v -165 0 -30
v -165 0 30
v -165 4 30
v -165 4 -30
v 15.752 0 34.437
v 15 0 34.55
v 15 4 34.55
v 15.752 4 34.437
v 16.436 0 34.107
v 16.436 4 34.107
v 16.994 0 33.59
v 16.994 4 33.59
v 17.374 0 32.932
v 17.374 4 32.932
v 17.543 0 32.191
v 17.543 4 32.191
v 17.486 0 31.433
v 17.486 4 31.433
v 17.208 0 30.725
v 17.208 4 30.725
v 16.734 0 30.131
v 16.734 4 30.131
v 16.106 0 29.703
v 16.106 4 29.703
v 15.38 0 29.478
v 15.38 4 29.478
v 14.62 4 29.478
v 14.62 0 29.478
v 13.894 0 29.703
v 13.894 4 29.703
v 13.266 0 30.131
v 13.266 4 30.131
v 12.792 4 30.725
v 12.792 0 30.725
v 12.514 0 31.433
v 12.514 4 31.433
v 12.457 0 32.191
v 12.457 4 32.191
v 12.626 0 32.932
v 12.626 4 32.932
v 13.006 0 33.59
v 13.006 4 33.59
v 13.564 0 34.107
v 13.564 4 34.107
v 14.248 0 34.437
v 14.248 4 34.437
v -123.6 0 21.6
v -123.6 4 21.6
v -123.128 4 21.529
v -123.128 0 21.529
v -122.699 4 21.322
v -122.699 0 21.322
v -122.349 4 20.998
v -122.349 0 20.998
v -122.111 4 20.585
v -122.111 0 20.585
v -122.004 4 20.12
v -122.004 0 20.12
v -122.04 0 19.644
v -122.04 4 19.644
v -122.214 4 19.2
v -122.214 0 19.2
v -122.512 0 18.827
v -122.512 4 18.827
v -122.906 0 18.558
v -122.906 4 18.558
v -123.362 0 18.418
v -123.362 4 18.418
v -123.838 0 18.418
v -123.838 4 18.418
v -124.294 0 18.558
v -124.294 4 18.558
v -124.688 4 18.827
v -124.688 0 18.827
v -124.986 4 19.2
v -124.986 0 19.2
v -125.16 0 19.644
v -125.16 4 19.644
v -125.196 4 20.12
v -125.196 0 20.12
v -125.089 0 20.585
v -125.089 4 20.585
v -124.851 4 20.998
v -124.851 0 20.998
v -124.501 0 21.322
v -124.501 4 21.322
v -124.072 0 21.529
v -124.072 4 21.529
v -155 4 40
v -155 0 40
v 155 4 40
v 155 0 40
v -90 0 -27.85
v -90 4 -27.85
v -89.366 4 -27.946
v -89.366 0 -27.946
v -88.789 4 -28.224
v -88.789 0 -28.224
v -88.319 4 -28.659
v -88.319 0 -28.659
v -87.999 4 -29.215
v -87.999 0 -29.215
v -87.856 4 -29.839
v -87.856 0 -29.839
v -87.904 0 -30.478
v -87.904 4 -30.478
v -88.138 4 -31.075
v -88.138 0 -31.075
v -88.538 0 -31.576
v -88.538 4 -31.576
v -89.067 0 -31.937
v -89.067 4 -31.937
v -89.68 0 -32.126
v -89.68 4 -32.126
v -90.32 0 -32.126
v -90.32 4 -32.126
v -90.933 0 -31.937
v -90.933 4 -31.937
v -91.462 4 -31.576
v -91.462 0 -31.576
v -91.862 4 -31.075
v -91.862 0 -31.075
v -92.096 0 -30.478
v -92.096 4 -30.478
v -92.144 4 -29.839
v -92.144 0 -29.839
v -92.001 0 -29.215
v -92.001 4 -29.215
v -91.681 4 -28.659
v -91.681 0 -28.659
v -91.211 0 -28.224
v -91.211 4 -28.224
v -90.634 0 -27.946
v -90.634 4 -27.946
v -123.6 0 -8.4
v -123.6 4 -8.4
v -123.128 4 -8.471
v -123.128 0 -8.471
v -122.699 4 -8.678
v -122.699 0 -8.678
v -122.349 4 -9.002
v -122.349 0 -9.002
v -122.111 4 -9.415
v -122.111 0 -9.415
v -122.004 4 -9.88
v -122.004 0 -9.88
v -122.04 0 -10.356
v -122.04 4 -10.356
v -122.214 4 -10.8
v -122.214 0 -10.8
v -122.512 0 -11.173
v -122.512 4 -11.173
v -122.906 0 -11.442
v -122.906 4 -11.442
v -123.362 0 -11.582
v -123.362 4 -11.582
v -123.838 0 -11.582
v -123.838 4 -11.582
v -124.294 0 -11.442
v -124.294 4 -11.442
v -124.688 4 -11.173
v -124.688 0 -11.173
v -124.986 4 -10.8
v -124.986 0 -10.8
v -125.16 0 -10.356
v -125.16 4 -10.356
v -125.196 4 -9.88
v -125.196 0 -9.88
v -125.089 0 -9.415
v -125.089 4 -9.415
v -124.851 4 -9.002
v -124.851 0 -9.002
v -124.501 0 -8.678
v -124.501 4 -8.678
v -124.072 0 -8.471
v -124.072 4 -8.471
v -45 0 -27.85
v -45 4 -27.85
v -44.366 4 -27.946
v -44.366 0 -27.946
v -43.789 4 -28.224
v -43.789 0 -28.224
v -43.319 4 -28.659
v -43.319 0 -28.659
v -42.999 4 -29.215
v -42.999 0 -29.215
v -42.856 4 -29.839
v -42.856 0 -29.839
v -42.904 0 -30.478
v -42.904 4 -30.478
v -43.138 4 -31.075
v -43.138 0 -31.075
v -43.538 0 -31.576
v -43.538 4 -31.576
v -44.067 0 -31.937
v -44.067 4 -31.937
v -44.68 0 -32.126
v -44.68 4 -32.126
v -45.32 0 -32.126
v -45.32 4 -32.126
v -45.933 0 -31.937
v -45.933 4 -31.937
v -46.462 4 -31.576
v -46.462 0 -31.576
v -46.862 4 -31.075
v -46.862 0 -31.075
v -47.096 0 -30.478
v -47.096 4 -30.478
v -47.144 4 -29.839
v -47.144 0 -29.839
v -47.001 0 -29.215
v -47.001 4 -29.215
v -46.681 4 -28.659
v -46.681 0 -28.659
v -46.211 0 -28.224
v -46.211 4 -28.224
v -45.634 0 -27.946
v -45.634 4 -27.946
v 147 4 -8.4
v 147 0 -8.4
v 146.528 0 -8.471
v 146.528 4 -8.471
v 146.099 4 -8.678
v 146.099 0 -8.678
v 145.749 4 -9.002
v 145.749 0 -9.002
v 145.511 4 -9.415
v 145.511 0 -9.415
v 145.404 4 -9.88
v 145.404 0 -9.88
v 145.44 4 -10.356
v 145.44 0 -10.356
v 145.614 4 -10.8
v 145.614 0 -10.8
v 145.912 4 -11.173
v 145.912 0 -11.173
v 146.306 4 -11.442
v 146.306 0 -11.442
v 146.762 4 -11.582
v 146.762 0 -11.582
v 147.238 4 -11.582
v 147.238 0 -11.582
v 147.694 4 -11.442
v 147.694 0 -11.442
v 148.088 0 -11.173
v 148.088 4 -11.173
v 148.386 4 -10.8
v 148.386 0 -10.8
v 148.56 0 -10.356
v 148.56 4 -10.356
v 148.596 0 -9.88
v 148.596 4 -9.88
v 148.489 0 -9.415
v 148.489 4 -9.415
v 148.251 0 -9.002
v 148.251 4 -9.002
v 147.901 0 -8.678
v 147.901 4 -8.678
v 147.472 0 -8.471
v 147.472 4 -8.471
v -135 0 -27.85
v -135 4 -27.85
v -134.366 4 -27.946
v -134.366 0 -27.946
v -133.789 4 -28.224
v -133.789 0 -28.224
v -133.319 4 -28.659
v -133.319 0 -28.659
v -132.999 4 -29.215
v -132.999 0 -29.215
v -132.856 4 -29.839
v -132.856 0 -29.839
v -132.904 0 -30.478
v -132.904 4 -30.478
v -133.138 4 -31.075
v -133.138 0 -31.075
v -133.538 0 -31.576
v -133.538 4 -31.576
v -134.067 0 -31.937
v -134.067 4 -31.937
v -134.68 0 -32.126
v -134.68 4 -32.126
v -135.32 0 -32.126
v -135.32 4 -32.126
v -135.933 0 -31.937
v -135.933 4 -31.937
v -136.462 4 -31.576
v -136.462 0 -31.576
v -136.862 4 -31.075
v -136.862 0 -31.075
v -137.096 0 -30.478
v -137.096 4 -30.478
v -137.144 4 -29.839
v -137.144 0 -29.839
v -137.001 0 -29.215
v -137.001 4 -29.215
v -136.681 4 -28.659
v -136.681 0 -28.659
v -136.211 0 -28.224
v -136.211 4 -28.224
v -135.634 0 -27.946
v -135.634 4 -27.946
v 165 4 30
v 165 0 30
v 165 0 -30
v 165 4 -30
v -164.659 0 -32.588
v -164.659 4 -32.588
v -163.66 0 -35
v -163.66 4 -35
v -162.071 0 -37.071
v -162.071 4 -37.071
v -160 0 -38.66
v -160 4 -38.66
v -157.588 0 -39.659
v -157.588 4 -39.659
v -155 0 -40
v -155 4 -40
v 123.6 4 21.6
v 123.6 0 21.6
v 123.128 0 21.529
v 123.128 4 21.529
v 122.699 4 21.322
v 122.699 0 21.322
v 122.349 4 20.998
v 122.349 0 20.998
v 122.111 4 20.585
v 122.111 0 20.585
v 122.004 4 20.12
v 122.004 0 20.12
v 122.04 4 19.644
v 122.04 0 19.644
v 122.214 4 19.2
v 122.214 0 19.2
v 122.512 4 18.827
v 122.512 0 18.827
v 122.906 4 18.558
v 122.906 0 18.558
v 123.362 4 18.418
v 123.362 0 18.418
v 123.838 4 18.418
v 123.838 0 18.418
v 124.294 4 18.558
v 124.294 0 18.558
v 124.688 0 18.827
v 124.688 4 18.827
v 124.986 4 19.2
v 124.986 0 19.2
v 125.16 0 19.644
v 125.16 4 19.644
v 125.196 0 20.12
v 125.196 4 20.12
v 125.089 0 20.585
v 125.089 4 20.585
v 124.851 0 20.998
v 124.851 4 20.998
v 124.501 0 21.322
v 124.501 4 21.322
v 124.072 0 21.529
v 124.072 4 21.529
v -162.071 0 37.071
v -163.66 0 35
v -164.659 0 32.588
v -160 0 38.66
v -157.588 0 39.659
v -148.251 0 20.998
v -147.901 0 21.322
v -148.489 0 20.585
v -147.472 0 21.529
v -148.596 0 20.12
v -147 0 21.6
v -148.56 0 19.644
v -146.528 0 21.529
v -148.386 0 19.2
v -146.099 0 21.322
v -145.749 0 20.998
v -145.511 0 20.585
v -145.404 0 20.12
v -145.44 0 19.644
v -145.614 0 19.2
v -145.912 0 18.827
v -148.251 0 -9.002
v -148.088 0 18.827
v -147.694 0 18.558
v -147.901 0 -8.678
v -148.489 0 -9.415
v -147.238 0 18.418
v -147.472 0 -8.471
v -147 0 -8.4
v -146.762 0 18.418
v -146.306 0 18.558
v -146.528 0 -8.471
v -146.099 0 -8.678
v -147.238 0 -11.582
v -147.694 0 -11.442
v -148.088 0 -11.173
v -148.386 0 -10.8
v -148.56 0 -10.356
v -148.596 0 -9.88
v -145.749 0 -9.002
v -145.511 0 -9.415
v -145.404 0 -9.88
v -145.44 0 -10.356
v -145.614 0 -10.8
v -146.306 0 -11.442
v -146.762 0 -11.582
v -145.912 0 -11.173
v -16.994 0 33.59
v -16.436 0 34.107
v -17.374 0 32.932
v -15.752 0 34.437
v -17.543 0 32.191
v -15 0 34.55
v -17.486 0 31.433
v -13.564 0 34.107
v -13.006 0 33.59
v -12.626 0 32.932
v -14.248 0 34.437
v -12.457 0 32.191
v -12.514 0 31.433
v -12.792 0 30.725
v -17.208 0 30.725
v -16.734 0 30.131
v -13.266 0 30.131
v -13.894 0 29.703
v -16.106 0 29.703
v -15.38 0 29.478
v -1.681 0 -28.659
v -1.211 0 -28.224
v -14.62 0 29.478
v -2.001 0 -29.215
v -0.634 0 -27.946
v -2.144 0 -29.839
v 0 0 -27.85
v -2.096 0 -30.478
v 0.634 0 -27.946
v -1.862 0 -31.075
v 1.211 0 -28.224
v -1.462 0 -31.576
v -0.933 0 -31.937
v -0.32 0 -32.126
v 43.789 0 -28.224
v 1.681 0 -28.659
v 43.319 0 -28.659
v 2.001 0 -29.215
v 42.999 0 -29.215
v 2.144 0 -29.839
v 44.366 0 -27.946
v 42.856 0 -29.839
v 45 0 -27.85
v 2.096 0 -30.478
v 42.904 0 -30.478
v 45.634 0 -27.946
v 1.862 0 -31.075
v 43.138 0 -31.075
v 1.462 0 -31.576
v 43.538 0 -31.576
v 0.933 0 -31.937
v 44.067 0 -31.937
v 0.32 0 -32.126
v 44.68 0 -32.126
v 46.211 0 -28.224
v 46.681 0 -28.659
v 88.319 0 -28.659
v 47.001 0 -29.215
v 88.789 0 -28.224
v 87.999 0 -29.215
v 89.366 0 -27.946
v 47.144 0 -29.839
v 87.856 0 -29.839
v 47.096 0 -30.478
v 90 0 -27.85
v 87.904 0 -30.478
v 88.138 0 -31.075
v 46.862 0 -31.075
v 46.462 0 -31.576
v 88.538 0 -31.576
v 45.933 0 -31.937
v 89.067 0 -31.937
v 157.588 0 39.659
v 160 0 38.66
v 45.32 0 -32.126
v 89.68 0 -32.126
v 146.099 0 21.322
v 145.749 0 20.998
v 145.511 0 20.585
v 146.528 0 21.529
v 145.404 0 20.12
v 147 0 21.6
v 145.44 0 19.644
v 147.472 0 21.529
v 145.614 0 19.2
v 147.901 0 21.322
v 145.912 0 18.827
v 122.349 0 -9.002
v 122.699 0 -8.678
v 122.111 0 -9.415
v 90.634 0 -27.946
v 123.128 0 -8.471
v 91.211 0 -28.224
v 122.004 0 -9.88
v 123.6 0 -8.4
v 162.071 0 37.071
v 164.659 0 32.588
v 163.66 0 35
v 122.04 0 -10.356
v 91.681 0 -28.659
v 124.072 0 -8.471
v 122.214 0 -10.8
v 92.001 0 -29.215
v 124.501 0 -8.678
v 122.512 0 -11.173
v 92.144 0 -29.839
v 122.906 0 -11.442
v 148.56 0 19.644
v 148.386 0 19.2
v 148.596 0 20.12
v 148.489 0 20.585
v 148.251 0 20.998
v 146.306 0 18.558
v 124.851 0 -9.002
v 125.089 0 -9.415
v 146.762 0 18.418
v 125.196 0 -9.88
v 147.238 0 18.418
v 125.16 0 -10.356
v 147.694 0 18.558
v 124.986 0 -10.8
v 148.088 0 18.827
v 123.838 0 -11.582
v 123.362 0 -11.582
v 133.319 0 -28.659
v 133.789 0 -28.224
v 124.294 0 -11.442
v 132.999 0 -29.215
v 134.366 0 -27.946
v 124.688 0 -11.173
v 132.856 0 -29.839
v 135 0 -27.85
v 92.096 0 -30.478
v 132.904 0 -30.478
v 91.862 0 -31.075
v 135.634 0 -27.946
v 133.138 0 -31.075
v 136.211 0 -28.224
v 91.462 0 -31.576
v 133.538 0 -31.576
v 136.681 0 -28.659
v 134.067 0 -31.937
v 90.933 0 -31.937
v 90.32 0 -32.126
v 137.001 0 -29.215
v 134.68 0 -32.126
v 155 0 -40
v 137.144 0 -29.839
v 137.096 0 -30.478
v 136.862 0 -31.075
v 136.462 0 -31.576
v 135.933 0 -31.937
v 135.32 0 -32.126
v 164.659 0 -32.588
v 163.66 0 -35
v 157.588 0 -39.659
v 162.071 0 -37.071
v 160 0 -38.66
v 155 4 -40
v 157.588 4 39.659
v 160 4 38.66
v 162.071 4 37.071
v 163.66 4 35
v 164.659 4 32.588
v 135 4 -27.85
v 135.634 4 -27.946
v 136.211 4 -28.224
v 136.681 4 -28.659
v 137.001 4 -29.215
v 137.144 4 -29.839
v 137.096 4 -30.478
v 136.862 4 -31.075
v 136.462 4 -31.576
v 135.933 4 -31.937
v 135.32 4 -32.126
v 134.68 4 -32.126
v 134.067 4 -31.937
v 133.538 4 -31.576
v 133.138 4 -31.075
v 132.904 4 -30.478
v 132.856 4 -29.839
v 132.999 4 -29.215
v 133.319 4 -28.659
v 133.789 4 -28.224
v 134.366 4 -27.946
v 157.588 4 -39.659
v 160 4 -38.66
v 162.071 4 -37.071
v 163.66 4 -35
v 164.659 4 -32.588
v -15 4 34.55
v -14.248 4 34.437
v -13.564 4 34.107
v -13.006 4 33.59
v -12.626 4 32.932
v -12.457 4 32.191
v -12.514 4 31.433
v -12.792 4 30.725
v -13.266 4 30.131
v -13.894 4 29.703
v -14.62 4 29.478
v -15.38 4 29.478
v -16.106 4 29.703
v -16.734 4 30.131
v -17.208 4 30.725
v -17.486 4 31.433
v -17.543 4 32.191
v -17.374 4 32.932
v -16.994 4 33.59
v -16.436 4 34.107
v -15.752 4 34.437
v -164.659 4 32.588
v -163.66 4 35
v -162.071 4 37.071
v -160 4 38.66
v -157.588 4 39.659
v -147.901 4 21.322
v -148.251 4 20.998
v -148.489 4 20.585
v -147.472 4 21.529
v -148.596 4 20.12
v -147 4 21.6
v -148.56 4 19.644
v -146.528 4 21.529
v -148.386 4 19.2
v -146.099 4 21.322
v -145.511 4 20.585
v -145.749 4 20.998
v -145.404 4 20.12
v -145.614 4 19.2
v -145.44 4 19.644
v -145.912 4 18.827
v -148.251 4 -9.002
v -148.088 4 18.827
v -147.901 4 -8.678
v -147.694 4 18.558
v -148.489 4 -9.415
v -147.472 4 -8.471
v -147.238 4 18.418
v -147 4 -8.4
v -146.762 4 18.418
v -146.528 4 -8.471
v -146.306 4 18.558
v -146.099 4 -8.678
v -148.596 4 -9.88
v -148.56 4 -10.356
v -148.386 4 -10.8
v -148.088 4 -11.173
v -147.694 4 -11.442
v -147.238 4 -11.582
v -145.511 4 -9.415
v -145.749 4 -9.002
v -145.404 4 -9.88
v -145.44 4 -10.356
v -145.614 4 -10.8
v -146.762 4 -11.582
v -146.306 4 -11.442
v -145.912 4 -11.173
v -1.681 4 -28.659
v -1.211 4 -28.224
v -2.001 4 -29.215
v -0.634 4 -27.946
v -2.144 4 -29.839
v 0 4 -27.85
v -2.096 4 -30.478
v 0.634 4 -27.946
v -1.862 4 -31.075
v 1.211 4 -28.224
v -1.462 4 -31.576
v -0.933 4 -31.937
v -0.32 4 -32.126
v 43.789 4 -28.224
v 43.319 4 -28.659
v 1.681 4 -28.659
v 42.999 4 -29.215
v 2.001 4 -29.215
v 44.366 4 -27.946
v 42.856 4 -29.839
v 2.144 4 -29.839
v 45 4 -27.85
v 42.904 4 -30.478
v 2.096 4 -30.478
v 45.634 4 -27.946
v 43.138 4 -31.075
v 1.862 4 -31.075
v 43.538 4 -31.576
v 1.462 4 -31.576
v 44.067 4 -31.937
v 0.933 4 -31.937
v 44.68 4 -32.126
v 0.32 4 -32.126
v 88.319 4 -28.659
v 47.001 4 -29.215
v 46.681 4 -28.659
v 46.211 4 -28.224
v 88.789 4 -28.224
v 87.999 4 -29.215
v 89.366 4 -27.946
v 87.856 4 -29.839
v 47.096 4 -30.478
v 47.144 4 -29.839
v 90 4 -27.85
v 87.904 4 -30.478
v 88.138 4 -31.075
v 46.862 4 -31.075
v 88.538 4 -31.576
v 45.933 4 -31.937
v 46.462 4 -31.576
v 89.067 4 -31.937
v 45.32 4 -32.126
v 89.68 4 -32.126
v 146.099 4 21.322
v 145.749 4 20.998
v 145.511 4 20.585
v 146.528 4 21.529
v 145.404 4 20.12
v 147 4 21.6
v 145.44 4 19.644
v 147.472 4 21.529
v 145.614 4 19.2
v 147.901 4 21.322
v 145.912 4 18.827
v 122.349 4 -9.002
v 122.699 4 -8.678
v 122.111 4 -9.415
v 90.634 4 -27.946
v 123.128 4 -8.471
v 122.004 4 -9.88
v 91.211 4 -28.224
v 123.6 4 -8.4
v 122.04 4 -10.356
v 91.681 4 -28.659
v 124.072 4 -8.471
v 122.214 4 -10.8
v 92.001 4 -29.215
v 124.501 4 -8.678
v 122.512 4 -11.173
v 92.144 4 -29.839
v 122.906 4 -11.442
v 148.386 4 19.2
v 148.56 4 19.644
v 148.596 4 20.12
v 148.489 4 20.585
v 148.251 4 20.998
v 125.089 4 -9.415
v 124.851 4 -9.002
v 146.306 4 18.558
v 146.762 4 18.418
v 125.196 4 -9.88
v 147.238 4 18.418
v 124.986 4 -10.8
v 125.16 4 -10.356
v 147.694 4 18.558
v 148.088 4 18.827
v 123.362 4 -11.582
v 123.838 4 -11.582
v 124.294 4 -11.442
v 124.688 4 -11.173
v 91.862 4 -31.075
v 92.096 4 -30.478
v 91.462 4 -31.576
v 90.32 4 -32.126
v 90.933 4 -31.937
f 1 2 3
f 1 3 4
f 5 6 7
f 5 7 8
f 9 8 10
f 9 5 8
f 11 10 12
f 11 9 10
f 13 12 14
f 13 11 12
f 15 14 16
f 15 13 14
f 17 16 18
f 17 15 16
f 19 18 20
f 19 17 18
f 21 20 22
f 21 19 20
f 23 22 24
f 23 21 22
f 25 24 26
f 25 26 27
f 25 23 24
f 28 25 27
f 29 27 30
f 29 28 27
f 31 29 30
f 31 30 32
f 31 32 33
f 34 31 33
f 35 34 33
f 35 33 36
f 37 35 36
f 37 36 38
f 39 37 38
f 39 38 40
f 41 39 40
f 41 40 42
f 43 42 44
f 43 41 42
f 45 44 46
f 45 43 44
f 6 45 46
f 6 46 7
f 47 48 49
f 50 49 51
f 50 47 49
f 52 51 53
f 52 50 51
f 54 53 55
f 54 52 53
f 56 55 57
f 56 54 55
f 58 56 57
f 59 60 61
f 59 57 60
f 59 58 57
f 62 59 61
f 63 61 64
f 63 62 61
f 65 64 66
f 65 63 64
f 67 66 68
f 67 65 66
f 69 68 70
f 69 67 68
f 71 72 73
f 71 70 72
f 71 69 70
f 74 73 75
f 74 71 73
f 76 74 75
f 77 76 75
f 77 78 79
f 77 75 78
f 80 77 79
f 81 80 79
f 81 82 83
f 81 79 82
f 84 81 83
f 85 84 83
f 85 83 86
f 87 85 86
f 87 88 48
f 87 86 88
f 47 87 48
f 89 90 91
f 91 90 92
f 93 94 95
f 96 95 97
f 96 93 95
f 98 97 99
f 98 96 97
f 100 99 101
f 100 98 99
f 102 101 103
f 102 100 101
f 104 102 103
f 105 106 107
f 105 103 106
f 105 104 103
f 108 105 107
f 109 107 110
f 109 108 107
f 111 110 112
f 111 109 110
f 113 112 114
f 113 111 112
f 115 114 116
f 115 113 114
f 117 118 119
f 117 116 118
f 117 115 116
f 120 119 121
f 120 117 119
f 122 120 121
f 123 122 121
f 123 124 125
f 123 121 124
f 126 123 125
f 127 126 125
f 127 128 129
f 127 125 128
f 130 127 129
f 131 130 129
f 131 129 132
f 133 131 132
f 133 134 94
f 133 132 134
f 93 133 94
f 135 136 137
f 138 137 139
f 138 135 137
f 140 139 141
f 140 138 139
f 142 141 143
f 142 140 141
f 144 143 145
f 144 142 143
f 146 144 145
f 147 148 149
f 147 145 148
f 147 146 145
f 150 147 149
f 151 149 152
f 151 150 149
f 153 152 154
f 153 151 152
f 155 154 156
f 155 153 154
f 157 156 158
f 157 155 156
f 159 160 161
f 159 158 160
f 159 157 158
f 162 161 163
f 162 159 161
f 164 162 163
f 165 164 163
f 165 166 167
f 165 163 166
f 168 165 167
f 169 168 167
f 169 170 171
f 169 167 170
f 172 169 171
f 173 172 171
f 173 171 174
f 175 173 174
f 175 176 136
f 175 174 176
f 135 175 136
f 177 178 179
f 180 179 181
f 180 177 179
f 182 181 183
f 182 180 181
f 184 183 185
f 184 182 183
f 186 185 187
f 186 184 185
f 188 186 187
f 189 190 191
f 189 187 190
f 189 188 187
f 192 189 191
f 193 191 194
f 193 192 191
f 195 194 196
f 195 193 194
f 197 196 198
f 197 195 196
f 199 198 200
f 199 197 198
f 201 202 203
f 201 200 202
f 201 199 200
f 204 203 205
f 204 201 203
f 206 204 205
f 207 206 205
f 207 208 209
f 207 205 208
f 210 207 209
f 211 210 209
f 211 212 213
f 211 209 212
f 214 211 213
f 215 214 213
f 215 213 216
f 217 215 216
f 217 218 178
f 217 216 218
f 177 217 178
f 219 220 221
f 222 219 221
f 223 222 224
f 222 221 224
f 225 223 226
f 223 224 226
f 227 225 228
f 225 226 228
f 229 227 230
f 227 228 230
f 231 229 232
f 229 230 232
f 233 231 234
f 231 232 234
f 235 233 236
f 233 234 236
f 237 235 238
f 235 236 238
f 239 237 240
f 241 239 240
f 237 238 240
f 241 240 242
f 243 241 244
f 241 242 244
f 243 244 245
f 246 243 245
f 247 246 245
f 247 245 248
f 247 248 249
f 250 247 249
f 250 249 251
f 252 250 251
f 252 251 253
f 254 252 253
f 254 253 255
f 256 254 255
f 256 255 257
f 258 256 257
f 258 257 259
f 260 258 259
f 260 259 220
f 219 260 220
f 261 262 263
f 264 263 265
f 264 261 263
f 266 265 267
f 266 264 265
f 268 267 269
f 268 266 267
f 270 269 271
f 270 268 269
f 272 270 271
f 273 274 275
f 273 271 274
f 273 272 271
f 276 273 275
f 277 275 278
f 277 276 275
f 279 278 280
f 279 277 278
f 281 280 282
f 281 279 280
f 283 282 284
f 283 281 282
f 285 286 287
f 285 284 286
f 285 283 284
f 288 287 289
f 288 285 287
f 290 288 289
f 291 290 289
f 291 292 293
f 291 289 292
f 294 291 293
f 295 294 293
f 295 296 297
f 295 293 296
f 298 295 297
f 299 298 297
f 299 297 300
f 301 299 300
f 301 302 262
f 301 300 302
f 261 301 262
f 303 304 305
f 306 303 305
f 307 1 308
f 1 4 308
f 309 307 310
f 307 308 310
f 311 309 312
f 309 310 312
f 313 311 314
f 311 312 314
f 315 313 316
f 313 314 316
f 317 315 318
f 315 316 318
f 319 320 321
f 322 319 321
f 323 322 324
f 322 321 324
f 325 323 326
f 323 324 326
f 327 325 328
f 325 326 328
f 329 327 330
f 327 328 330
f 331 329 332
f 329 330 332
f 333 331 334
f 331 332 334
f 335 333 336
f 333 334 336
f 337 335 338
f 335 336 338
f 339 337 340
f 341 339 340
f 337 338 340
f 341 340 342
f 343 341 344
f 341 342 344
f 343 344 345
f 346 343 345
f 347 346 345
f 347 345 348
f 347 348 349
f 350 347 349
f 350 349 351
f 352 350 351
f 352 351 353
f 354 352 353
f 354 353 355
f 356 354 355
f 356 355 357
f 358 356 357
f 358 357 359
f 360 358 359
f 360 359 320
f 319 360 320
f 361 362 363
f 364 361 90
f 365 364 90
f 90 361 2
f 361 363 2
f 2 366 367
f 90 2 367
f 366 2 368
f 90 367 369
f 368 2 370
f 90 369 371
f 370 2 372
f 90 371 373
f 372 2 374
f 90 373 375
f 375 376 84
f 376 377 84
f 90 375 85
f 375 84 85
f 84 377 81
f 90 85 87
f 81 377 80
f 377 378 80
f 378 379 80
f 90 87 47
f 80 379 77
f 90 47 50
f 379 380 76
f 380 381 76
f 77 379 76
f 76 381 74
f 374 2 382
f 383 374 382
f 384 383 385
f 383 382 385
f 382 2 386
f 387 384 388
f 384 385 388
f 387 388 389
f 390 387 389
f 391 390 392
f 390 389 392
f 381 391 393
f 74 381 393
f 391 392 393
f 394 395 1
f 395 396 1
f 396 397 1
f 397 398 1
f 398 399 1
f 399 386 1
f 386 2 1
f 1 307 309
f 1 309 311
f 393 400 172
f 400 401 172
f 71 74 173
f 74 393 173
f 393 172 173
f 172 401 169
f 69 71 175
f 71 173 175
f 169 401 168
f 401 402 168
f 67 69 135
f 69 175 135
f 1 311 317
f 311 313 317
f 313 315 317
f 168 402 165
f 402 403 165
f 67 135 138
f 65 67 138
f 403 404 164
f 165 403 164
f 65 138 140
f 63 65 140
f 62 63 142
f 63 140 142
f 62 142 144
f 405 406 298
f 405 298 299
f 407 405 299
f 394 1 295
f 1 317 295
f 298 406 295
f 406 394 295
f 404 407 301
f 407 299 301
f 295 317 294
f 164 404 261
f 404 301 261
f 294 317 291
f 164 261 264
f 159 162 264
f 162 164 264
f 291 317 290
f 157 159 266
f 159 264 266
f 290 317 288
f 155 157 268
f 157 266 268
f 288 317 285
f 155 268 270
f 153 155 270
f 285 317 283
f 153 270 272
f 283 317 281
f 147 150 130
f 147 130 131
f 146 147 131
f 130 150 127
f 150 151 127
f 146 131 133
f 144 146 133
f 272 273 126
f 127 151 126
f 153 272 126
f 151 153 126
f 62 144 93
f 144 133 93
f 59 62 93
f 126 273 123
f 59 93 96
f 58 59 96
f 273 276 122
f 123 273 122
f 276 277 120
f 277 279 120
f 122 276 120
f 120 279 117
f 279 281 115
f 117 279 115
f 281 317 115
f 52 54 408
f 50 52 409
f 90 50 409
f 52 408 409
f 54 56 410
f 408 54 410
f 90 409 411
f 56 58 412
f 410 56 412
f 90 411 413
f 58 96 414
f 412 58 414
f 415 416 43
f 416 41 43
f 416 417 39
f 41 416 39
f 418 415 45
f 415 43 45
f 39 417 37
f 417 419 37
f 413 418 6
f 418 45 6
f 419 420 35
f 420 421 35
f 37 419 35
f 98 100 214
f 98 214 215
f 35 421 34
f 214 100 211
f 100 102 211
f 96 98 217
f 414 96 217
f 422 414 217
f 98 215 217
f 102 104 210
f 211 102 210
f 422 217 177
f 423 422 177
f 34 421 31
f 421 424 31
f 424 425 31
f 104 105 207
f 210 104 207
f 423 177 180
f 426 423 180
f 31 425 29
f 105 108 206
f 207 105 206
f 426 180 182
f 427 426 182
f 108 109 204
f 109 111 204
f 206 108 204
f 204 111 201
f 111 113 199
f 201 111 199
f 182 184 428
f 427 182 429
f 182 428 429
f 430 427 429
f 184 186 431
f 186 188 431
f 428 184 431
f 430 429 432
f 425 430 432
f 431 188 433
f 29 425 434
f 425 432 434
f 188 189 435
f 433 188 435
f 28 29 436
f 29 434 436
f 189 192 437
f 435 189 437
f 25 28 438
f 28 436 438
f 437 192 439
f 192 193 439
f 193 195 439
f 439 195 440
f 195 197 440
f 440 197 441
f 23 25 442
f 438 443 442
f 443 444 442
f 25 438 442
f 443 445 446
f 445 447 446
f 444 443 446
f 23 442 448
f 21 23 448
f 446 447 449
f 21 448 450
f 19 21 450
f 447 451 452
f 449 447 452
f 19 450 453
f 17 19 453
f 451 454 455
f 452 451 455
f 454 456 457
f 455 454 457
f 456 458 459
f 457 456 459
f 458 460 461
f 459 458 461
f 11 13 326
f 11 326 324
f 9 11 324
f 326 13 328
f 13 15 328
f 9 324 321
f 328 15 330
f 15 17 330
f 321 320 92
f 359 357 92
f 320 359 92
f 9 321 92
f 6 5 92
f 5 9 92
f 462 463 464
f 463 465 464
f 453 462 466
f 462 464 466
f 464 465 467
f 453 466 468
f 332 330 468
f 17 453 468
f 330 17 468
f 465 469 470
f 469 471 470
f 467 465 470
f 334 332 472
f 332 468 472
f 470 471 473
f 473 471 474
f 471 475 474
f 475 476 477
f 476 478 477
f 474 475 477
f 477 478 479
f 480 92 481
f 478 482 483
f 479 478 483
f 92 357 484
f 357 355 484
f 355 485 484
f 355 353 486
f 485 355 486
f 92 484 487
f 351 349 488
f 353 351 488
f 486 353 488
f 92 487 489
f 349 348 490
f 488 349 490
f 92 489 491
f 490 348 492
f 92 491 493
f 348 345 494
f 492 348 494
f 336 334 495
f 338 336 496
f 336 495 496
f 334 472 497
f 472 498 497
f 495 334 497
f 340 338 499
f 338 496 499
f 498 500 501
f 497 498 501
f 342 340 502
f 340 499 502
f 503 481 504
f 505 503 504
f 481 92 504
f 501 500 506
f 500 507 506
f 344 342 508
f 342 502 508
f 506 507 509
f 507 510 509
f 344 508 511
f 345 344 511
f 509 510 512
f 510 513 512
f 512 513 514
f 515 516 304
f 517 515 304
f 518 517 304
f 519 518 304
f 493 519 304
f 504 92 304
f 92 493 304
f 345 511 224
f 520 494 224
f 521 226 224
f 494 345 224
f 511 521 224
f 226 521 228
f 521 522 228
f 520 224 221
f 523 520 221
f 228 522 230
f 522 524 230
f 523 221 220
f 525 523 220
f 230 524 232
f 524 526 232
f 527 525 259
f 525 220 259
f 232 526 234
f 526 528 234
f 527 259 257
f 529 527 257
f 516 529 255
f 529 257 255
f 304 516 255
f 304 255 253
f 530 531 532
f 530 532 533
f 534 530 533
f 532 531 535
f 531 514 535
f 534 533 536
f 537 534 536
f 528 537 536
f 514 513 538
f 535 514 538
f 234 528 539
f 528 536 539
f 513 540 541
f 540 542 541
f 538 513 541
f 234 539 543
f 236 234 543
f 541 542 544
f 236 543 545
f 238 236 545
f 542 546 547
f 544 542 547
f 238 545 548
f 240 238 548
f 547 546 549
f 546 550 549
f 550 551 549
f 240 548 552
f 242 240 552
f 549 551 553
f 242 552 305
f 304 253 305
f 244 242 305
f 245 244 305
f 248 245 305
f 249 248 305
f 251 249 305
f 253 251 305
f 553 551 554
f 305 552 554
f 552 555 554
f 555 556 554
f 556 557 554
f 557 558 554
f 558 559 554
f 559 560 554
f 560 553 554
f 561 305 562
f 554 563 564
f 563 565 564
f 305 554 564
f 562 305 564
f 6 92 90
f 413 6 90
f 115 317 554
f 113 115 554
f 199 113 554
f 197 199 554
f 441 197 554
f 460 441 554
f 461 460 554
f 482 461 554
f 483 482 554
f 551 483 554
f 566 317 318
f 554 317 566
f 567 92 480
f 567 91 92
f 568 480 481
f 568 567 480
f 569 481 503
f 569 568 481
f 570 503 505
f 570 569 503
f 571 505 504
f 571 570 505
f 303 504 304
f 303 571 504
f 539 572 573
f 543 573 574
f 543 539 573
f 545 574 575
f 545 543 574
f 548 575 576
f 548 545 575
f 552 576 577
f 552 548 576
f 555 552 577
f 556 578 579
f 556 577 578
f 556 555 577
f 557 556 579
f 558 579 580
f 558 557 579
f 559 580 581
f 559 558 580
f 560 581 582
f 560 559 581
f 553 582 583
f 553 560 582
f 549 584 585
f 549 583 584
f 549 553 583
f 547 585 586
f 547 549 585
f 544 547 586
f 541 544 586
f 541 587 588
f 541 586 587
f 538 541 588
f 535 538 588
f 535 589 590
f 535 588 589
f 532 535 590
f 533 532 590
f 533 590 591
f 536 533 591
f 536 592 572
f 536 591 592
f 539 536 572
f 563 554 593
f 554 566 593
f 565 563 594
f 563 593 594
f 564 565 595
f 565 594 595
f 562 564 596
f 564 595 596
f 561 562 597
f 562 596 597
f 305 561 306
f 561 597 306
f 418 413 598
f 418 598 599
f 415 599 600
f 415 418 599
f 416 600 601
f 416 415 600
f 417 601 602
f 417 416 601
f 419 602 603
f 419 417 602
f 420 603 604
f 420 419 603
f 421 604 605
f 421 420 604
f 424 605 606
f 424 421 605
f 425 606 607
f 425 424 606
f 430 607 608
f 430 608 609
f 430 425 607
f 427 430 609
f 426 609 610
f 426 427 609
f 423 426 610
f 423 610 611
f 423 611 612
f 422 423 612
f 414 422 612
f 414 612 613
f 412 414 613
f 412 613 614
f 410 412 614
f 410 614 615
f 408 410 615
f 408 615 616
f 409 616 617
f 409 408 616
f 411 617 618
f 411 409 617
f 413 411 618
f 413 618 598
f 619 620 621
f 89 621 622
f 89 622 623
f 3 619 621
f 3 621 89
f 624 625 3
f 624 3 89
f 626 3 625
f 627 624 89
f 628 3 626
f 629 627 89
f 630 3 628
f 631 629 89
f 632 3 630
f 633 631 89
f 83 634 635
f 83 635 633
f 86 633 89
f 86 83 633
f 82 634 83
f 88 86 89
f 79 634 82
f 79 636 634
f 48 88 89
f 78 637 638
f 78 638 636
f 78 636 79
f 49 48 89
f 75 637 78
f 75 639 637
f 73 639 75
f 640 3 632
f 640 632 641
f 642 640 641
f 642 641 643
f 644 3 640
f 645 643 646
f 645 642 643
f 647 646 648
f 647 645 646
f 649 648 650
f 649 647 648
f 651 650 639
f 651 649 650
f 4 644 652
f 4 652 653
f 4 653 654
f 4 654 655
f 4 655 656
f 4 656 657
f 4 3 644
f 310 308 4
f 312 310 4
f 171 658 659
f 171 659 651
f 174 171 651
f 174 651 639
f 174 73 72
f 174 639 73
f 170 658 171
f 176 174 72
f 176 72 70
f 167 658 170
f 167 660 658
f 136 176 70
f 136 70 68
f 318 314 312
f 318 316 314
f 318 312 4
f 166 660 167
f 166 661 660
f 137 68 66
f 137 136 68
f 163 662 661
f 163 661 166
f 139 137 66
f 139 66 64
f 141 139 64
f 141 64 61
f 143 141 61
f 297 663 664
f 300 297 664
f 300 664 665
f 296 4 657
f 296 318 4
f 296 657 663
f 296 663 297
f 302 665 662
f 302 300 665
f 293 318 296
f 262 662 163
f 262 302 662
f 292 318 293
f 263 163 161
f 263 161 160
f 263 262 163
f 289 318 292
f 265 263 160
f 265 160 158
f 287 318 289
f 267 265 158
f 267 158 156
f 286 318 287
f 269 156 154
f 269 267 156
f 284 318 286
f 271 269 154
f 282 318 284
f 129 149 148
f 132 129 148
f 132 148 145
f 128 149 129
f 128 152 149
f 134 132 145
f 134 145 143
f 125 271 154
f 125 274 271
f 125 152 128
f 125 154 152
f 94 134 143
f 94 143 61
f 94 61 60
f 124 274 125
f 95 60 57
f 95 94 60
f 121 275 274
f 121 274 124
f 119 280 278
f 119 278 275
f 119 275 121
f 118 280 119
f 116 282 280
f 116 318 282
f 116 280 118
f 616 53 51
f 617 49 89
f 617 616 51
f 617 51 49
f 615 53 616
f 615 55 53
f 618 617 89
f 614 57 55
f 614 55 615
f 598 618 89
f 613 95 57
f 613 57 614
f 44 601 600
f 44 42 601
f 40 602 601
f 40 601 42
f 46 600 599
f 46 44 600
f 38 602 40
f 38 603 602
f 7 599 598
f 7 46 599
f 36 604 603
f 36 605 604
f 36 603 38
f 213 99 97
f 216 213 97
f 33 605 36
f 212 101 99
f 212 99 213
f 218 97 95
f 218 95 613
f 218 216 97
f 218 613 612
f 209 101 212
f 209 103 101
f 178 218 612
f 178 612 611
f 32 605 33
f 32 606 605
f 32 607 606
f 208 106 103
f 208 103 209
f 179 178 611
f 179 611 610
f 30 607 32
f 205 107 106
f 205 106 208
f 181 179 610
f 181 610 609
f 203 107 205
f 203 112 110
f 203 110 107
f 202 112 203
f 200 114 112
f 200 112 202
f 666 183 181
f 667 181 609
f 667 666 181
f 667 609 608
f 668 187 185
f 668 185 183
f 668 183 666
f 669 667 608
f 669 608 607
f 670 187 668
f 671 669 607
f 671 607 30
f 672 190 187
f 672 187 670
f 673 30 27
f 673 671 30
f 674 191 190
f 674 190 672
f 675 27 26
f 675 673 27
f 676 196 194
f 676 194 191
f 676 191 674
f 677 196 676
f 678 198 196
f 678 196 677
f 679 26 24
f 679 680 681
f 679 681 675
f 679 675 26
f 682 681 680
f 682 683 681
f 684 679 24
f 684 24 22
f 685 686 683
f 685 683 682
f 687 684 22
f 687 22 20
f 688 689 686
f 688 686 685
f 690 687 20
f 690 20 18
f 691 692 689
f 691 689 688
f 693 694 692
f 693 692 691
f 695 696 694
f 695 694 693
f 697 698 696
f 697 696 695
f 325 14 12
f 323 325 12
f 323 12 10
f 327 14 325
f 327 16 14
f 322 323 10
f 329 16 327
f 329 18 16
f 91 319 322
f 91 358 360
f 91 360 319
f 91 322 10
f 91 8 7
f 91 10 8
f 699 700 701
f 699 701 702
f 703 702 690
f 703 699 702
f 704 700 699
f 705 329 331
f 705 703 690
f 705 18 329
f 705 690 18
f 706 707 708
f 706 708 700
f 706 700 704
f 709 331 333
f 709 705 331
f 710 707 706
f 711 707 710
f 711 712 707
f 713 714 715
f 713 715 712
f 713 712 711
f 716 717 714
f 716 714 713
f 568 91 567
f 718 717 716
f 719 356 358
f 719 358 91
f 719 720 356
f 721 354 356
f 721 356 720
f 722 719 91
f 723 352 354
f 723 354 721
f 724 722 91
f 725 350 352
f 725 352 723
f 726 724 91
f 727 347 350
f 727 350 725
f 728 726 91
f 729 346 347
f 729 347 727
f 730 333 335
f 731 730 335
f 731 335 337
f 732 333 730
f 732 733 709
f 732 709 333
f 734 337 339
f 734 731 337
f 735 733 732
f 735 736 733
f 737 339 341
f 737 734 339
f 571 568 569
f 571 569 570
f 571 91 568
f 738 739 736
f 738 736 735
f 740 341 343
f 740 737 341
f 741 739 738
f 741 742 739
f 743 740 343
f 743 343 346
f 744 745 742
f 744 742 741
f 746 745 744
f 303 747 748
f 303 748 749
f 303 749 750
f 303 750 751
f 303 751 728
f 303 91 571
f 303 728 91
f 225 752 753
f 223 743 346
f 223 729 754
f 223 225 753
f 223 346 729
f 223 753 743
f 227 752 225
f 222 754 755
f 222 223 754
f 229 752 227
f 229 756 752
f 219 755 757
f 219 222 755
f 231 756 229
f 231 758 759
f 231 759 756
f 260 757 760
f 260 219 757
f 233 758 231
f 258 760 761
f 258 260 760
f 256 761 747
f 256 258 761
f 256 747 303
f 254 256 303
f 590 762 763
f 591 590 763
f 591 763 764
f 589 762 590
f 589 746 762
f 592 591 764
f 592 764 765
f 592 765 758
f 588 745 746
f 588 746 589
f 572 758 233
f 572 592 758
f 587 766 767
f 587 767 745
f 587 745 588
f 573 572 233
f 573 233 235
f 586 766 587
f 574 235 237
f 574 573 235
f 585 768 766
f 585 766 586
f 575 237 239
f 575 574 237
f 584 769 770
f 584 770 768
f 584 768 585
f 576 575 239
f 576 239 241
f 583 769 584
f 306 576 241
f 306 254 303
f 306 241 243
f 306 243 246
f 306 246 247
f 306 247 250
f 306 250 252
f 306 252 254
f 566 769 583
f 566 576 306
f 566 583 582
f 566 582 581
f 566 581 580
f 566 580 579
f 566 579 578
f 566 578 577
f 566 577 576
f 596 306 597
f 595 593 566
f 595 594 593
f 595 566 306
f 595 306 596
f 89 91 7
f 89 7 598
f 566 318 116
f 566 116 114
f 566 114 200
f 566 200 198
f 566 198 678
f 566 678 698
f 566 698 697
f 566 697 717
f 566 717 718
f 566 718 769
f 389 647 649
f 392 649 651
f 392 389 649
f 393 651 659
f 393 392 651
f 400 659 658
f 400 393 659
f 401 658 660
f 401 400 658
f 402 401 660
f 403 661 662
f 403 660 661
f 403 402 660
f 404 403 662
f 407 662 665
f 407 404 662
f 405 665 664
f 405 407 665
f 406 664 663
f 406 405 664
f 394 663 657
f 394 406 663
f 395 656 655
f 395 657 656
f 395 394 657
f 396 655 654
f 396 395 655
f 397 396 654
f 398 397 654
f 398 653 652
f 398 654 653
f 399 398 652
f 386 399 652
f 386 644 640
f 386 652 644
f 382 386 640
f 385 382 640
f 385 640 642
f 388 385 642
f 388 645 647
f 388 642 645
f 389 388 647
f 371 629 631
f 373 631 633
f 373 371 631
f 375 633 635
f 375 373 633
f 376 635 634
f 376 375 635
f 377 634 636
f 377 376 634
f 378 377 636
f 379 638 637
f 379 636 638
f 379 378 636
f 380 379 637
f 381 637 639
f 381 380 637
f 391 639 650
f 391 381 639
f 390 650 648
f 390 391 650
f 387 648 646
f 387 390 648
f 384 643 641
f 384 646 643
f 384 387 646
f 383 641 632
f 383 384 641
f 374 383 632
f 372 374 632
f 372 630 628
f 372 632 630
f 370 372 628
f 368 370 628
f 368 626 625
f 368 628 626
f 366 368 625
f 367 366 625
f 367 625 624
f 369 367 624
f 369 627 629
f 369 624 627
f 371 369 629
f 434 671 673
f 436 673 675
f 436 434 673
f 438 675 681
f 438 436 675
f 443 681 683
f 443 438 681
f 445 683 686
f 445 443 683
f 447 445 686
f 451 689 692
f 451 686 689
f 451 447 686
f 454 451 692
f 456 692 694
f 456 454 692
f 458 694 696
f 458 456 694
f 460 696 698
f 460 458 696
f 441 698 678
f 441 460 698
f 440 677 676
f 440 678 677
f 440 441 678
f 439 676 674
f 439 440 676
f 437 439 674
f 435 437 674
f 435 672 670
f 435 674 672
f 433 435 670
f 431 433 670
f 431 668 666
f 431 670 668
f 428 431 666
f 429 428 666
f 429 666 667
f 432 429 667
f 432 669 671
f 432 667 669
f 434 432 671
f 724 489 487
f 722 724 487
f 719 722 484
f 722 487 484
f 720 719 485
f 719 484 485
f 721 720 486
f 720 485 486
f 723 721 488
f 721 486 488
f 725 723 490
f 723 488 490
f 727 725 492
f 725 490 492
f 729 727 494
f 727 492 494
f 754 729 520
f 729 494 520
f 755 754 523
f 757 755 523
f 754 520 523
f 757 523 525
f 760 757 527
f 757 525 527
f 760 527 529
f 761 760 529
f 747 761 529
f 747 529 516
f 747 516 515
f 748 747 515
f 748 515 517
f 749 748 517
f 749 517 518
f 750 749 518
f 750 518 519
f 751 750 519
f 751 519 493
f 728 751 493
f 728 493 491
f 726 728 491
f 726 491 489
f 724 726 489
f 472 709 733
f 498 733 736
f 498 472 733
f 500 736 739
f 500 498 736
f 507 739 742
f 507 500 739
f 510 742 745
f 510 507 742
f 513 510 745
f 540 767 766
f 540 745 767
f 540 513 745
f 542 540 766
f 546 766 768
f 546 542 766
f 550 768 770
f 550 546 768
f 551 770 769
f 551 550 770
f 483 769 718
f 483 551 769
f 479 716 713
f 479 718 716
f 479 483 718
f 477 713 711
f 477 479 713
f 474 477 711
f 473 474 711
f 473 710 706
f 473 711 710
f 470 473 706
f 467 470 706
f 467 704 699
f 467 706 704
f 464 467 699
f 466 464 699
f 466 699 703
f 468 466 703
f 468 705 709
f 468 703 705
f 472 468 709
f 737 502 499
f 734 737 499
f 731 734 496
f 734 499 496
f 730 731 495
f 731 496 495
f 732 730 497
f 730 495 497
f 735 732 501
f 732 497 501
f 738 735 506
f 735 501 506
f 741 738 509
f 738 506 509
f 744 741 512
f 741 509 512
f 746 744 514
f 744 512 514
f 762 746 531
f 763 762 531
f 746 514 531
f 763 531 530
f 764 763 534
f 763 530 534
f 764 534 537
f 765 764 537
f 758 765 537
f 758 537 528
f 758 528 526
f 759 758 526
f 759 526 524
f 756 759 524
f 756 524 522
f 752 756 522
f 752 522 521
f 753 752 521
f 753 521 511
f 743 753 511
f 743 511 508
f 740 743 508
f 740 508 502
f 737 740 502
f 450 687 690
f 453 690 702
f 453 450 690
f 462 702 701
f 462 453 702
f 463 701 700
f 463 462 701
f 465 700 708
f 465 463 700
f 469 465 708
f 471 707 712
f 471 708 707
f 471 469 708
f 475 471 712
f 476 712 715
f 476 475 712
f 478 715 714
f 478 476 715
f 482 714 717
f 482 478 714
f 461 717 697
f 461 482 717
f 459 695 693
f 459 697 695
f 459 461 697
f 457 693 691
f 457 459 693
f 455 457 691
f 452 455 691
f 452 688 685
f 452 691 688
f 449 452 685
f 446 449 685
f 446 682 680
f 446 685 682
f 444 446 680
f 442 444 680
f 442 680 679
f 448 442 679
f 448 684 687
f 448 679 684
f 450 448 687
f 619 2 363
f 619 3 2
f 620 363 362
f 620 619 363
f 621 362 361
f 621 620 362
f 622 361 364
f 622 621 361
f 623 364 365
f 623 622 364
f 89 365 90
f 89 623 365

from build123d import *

# Parameters (mm, degrees)
SKETCH_2_W                 = 330
SKETCH_2_H                 = 80
SKETCH_2_R                 = 2.55
EXTRUDE_1_DEPTH            = 4
SKETCH_3_R                 = 1.6
CUT_EXTRUDE_1_DEPTH        = 170.826381932
SKETCH_4_R                 = 2.15
CUT_EXTRUDE_2_DEPTH        = 170.826381932
PATTERN_LINEAR_1_COUNT     = 4
PATTERN_LINEAR_1_PITCH     = 45
PATTERN_LINEAR_1_COL_COUNT = 4
PATTERN_LINEAR_1_COL_PITCH = 45
FILLET_1_R                 = 10


with BuildPart() as part:
    # 草图2 → 凸台-拉伸1 (new body)
    with BuildSketch(Plane(origin=(0, 0, 0), x_dir=(1, 0, 0), z_dir=(0, 1, 0))):
        Rectangle(SKETCH_2_W, SKETCH_2_H)
        with Locations(Location((-15, -32, 0), (0, 0, 270))):
            Circle(SKETCH_2_R, mode=Mode.SUBTRACT)
        with Locations(Location((15, -32, 0), (0, 0, 270))):
            Circle(SKETCH_2_R, mode=Mode.SUBTRACT)
    extrude(amount=EXTRUDE_1_DEPTH)

    # 草图3 → 切除-拉伸1 (cut, through all)
    with BuildSketch(Plane(origin=(0, 0, 0), x_dir=(1, 0, 0), z_dir=(0, 1, 0))):
        with Locations(Location((-147, 10, 0), (0, 0, 270))):
            Circle(SKETCH_3_R)
        with Locations(Location((-147, -20, 0), (0, 0, 270))):
            Circle(SKETCH_3_R)
        with Locations(Location((-123.6, -20, 0), (0, 0, 270))):
            Circle(SKETCH_3_R)
        with Locations(Location((-123.6, 10, 0), (0, 0, 270))):
            Circle(SKETCH_3_R)
    cut_extrude_1 = extrude(amount=CUT_EXTRUDE_1_DEPTH, mode=Mode.SUBTRACT)

    # 镜向1: 切除-拉伸1 across plane
    add(cut_extrude_1.mirror(Plane(origin=(0, 0, 0), x_dir=(0, 0, 1), z_dir=(1, 0, 0))), mode=Mode.SUBTRACT)

    # 草图4 → 切除-拉伸2 (cut, through all)
    with BuildSketch(Plane(origin=(0, 0, 0), x_dir=(1, 0, 0), z_dir=(0, 1, 0))):
        with Locations(Location((0, 30, 0), (0, 0, 270))):
            Circle(SKETCH_4_R)
    cut_extrude_2 = extrude(amount=CUT_EXTRUDE_2_DEPTH, mode=Mode.SUBTRACT)

    # 阵列(线性)1: 切除-拉伸2 ×4
    with Locations(*[(i * PATTERN_LINEAR_1_PITCH, 0, 0) for i in range(1, PATTERN_LINEAR_1_COUNT)]):
        add(cut_extrude_2, mode=Mode.SUBTRACT)

    # 阵列(线性)1 col: 切除-拉伸2 ×4
    with Locations(*[(-i * PATTERN_LINEAR_1_COL_PITCH, 0, 0) for i in range(1, PATTERN_LINEAR_1_COL_COUNT)]):
        add(cut_extrude_2, mode=Mode.SUBTRACT)

    # 圆角1
    fillet_1_edges = [part.edges().sort_by_distance(p)[0] for p in [
        (-165, 2, 40),
        (-165, 2, -40),
        (165, 2, -40),
        (165, 2, 40),
    ]]
    fillet(fillet_1_edges, radius=FILLET_1_R)


solid = part.part
